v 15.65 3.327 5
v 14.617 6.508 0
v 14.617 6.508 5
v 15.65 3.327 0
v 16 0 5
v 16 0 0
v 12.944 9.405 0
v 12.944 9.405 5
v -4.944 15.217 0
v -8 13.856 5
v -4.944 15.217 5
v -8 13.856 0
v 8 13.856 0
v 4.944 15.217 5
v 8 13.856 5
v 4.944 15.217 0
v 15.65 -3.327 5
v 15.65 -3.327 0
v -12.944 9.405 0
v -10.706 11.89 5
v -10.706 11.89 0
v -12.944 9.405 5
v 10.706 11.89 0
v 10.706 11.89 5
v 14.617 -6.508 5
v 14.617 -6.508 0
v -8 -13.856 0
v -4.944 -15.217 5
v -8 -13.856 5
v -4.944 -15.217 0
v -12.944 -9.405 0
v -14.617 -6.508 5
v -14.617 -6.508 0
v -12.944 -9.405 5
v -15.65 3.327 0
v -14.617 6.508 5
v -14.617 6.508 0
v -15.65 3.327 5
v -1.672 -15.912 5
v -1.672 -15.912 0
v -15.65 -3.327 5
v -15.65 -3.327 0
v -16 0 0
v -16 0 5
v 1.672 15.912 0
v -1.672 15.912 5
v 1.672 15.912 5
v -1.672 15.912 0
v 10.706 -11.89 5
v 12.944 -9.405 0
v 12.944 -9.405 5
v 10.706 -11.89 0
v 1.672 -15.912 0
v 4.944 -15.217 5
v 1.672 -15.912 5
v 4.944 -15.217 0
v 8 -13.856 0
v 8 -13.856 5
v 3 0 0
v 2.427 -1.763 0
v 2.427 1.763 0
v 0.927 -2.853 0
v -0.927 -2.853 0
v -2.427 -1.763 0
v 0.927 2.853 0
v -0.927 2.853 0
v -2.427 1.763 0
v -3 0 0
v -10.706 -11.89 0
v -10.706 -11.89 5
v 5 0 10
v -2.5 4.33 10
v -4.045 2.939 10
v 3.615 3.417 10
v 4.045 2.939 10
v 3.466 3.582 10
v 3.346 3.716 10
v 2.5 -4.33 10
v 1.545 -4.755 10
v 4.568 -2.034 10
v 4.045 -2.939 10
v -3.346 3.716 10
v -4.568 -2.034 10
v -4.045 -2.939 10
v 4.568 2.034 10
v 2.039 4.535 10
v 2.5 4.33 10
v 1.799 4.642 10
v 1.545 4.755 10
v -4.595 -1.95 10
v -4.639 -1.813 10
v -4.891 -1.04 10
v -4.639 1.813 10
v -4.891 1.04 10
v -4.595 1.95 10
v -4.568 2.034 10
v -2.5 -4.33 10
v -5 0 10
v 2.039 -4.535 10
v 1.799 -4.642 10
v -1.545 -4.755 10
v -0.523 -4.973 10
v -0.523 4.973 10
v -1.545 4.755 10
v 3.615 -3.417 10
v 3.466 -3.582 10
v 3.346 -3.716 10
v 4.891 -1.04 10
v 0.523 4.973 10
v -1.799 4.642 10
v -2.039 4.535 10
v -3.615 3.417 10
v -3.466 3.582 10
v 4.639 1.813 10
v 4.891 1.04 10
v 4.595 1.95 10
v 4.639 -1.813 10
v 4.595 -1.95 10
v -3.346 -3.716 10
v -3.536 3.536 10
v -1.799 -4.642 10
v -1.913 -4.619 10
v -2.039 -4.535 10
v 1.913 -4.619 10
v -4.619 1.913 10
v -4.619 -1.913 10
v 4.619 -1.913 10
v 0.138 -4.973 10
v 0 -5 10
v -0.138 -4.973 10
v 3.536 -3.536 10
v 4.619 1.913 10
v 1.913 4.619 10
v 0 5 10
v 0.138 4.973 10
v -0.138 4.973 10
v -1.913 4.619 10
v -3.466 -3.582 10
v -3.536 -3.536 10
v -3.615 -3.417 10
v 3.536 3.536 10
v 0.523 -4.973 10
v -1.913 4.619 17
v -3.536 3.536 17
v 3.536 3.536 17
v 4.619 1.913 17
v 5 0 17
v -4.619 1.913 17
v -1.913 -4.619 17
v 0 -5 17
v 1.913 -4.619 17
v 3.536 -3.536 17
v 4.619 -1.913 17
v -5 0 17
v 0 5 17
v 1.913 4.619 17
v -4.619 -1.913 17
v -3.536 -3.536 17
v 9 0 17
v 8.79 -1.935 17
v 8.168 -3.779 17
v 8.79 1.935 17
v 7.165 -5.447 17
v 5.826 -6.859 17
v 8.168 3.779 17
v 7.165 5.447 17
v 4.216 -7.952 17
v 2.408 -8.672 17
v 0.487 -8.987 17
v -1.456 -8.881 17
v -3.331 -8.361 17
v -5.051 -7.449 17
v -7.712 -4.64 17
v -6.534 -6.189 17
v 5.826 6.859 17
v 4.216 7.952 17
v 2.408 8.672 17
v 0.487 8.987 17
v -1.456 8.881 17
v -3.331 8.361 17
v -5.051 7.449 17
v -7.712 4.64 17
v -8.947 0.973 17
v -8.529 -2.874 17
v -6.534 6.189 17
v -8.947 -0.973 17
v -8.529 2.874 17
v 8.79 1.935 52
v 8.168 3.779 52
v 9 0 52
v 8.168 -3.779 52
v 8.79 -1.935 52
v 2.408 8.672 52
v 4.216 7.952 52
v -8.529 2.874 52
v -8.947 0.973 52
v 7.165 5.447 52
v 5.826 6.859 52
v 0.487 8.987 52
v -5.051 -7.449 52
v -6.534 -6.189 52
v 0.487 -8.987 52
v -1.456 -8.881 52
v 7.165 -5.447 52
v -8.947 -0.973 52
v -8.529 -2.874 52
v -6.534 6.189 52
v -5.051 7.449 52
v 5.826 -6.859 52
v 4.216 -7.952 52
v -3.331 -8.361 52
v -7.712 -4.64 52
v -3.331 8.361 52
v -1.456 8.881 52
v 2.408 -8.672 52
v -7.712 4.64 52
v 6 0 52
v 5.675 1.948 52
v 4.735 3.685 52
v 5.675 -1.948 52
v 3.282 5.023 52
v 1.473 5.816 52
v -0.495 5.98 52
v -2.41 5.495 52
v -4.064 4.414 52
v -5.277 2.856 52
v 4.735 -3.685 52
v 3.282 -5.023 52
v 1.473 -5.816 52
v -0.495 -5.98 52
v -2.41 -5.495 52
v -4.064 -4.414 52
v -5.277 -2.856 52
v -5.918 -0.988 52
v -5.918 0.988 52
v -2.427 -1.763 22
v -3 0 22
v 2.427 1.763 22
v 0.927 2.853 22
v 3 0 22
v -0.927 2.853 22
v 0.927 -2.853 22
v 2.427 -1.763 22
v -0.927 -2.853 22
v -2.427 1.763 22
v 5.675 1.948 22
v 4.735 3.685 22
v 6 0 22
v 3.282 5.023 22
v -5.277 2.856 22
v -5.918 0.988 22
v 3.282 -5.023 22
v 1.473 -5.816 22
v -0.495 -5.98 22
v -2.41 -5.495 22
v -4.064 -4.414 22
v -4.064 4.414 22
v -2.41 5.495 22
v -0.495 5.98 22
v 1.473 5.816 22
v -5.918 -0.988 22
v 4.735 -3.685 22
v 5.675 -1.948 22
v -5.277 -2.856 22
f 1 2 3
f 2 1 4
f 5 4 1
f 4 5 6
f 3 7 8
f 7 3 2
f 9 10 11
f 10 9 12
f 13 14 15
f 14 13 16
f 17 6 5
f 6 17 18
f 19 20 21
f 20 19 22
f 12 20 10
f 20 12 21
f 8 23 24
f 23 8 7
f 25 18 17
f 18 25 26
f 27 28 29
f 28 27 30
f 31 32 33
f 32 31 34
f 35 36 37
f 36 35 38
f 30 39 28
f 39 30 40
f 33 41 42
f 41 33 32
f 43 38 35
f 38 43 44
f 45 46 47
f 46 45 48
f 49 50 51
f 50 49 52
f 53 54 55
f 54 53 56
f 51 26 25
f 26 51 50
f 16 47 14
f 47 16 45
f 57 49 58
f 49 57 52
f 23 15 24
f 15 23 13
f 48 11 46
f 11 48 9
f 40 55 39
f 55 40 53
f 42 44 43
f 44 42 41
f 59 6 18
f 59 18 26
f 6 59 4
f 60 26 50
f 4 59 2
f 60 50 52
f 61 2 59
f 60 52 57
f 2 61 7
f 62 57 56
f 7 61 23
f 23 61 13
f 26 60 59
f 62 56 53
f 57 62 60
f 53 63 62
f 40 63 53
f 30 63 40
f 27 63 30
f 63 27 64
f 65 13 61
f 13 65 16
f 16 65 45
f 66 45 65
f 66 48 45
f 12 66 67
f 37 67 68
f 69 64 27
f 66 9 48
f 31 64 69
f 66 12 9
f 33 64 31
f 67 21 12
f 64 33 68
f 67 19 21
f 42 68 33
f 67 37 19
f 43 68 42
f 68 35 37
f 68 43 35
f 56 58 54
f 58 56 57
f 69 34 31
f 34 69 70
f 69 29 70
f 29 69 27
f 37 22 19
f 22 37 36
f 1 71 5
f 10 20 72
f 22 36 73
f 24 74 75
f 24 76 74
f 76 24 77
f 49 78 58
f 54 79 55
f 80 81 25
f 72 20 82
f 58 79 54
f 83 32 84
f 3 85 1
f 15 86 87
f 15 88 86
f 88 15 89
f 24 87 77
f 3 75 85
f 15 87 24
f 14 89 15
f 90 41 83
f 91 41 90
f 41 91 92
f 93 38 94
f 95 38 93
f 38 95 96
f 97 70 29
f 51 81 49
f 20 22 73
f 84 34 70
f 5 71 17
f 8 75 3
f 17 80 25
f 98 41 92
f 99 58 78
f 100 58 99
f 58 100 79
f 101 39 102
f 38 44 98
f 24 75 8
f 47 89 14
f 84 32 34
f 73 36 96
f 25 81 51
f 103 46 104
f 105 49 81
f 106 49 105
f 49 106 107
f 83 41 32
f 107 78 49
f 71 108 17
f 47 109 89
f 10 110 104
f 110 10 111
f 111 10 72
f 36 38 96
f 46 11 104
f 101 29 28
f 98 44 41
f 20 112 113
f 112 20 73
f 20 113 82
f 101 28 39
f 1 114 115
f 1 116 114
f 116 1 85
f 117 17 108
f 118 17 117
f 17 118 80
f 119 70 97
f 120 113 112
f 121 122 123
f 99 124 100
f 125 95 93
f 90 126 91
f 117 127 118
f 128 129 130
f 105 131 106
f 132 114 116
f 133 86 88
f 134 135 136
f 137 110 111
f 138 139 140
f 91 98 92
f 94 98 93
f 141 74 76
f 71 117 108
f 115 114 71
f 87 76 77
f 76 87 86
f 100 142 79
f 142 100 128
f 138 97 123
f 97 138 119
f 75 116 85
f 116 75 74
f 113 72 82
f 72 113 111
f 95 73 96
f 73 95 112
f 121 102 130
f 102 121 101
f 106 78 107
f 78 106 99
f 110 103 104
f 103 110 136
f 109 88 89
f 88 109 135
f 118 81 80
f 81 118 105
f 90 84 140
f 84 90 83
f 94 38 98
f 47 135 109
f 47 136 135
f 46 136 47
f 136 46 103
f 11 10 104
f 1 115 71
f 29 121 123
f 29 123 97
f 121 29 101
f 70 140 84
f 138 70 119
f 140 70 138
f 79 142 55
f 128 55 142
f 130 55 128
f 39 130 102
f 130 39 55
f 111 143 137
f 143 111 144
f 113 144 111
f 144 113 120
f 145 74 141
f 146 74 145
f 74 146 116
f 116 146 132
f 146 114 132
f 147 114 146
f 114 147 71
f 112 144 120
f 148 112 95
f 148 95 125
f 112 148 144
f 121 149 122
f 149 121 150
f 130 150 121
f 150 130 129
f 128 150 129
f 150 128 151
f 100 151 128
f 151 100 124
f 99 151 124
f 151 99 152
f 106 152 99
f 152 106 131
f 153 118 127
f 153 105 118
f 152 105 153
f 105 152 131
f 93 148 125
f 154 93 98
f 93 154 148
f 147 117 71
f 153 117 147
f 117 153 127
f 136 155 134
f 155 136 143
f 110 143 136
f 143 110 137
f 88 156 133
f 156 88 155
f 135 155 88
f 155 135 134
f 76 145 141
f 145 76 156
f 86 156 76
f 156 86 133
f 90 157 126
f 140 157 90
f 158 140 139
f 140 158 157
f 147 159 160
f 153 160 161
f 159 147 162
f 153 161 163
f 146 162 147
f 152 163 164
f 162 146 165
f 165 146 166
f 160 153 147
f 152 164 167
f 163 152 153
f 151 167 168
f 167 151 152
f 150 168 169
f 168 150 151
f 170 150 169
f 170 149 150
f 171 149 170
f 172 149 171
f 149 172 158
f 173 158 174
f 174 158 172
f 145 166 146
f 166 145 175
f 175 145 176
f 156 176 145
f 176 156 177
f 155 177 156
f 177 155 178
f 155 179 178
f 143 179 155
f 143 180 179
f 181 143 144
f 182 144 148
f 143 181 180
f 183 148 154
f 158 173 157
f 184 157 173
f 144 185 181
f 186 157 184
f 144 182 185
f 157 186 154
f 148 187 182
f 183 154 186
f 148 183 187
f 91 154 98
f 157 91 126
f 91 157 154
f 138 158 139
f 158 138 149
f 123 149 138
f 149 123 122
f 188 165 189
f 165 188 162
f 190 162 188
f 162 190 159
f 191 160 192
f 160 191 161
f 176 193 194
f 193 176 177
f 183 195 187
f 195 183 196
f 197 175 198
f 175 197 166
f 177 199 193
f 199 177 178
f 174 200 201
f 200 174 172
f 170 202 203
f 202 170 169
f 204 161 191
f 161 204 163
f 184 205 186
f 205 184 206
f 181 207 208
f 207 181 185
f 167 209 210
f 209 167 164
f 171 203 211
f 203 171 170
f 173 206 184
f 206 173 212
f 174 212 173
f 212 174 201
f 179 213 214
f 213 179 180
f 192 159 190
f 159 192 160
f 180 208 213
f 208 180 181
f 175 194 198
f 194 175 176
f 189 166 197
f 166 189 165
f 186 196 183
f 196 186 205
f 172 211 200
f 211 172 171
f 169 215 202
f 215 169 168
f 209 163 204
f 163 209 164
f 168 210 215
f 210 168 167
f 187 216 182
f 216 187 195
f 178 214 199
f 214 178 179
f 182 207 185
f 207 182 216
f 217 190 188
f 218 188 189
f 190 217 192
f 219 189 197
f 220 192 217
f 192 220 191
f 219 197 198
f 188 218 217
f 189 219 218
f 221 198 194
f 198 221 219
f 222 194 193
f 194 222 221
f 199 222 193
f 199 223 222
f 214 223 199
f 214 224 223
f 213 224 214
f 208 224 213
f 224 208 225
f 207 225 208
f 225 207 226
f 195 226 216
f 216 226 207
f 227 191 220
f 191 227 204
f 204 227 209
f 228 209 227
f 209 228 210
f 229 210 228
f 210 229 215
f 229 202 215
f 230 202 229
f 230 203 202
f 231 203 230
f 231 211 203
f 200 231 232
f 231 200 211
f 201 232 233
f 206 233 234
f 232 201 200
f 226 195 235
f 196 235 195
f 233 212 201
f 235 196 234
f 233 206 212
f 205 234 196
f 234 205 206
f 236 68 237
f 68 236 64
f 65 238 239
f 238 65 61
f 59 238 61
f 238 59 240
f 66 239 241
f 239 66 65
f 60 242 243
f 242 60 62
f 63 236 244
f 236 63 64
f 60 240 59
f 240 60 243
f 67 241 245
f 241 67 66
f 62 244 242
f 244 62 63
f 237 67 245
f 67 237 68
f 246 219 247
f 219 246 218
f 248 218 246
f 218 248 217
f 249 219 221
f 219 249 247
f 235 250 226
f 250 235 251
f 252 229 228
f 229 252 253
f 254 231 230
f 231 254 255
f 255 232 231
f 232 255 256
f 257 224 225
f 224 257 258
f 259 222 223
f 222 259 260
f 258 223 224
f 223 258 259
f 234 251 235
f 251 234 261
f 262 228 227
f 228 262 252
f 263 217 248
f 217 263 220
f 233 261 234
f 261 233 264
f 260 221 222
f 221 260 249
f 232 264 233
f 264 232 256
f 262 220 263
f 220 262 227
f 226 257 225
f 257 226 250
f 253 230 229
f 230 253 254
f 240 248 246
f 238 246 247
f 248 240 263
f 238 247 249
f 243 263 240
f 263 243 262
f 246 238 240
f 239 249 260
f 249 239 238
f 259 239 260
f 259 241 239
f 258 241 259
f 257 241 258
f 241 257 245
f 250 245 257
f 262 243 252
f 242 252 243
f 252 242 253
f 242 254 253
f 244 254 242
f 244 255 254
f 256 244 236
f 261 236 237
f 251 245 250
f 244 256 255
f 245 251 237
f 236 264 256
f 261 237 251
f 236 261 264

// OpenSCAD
difference()
{
    union()
    {
        cylinder(5, 16, 16);
        translate([0, 0, 5]) cylinder(5, 16, 5);
        translate([0, 0, 10]) cylinder(7, 5, 5);
        translate([0, 0, 17]) cylinder(5, 9, 9);
        translate([0, 0, 22]) cylinder(30, 9, 9);
    }
    union() {
        translate([0, 0, -3]) cylinder(80, 3, 3);
        translate([0, 0, 22]) cylinder(35, 6, 6);
    }

}

// translate([0, 0, 5]); cylinder(7, 5, 5);
